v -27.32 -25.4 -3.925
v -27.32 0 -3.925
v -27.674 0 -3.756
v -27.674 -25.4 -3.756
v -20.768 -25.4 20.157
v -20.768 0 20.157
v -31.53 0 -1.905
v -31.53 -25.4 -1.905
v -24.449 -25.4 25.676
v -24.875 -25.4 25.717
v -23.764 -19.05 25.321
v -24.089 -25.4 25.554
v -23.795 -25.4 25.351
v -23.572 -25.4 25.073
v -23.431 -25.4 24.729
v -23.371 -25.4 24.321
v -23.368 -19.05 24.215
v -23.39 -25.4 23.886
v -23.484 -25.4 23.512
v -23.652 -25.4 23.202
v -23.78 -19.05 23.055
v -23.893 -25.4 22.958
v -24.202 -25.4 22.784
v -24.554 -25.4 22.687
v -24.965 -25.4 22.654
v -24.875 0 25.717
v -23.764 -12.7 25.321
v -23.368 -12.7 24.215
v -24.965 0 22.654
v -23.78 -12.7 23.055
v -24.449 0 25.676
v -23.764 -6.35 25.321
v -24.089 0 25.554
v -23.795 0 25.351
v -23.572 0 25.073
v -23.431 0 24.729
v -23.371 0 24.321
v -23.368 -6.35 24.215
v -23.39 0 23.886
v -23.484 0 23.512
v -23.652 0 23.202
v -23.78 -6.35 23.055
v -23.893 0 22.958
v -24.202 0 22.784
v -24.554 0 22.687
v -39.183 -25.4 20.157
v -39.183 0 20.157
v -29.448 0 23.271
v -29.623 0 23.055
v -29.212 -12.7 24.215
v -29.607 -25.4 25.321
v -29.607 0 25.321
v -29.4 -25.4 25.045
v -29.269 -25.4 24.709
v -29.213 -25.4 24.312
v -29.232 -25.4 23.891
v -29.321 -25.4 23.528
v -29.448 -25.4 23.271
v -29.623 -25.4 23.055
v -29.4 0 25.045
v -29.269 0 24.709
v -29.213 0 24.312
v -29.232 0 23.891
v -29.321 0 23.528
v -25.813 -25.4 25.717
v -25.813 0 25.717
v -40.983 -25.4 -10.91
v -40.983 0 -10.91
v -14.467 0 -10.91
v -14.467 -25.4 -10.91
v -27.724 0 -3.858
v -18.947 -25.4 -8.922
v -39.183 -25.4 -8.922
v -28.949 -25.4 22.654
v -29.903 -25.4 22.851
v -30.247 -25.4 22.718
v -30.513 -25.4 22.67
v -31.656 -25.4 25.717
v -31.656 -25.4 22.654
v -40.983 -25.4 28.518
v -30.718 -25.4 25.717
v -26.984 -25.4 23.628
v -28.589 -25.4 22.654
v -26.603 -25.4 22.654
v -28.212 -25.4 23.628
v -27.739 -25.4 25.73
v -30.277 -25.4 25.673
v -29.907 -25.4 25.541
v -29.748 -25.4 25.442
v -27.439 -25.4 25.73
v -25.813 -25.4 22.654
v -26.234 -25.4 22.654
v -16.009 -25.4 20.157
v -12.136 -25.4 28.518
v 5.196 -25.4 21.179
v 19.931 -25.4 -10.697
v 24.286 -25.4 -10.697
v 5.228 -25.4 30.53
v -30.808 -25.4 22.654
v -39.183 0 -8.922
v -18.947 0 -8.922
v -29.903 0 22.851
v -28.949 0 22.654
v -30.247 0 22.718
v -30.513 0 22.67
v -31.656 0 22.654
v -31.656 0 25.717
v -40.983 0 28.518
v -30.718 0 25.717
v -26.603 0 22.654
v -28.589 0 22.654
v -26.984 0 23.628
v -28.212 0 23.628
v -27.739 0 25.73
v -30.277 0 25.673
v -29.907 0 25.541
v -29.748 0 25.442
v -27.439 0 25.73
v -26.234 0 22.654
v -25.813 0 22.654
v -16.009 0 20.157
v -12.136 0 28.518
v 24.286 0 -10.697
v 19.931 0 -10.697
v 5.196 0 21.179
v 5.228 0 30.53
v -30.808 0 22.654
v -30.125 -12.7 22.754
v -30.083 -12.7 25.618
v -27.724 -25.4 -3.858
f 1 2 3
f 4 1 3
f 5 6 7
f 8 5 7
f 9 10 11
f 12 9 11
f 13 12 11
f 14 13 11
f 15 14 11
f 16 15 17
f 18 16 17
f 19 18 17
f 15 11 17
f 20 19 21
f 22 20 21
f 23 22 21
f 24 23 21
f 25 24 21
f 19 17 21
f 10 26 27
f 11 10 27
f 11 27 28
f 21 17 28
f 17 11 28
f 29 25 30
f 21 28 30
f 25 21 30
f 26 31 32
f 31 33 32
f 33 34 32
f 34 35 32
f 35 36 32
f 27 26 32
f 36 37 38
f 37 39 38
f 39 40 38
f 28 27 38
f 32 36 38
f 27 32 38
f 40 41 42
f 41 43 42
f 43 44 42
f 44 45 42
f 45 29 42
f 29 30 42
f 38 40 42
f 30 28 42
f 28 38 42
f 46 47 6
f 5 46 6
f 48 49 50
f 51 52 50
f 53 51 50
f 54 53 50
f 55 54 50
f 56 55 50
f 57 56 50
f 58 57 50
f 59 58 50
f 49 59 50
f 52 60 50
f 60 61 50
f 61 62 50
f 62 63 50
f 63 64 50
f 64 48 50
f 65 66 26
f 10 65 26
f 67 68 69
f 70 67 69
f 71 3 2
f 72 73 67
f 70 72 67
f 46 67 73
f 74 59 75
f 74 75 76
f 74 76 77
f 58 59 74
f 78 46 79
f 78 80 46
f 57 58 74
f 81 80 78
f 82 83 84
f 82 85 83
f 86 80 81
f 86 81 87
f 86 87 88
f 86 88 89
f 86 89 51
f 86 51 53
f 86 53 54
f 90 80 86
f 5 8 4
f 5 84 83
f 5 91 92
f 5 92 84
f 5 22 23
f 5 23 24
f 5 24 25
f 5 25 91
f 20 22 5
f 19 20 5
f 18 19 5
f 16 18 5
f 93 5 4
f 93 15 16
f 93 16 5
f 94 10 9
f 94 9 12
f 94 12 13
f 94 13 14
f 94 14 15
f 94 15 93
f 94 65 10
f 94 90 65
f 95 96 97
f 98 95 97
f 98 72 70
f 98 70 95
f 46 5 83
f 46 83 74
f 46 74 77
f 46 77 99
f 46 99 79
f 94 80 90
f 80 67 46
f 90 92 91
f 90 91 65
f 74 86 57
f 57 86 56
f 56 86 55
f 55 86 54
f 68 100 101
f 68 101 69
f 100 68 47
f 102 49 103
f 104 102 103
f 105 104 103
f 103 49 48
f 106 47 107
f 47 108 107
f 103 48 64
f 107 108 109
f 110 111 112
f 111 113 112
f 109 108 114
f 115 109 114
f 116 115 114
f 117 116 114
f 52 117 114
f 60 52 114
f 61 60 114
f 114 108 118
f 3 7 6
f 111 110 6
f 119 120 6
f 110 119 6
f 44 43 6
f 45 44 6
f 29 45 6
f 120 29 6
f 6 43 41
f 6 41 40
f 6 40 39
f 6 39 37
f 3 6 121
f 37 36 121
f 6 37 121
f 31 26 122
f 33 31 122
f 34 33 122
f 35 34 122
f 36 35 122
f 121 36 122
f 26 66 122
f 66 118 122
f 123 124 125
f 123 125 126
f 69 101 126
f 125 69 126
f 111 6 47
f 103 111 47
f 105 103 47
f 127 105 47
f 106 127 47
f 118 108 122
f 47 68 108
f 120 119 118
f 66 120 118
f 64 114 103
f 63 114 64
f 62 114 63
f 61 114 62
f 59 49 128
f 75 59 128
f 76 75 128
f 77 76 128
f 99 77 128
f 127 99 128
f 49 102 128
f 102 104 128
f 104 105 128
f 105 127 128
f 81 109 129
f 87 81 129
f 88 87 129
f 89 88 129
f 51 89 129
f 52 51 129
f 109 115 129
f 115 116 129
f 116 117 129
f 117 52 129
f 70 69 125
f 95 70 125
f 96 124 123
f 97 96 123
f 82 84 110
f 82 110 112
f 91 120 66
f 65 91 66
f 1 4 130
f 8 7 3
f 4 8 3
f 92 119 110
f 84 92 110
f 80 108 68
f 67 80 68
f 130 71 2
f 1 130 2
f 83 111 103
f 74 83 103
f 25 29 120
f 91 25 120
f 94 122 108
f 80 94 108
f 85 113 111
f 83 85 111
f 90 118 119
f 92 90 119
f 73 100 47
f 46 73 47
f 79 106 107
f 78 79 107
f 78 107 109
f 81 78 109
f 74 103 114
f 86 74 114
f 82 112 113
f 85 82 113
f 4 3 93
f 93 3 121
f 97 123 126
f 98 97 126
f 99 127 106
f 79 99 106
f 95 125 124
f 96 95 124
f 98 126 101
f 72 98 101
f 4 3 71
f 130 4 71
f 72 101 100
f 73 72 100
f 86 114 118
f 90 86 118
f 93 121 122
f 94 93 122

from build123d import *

# Parameters (mm, degrees)
F1_DEPTH = 25.4


with BuildPart() as f1:
    # F0 (on Front) → F1 (new body)
    with BuildSketch(Plane.XZ):
        Polygon((-14.4669092909, -10.910328379), (5.1957434184, 21.1789465251), (19.9311329773, -10.6970844829), (24.28571788, -10.6970844829), (5.2277326737, 30.5297134213), (-18.9465156888, -8.9224455917), (-39.1826219857, -8.9224455917), (-39.1826219857, 20.1574359089), (-20.7683040569, 20.1574359089), (-31.5304366217, -1.9054901972), (-27.6739607229, -3.7556812486), (-16.0093186147, 20.1574359089), (-12.1359187178, 28.5178888589), (-32.0774856955, 28.5178888589), (-40.9832447767, 28.5178888589), (-40.9832447767, -8.9224455917), (-40.9832447767, -10.910328379), align=None)
        with BuildLine():
            add(Edge.make_bspline(
                [(-29.6074078263, 25.3212274207), (-29.2115383781, 24.9253579726), (-29.2115383781, 24.2147371173)],
                knots=[0, 0, 0, 1, 1, 1], degree=2))
            add(Edge.make_bspline(
                [(-29.2115383781, 24.2147371173), (-29.2115383781, 23.4565180726), (-29.6231621566, 23.0552854482)],
                knots=[0, 0, 0, 1, 1, 1], degree=2))
            add(Edge.make_bspline(
                [(-29.6231621566, 23.0552854482), (-30.034785935, 22.6540528238), (-30.8077537144, 22.6540528238)],
                knots=[0, 0, 0, 1, 1, 1], degree=2))
            Line((-30.8077537144, 22.6540528238), (-31.6564763586, 22.6540528238))
            Line((-31.6564763586, 22.6540528238), (-31.6564763586, 25.7170968689))
            Line((-31.6564763586, 25.7170968689), (-30.717920512, 25.7170968689))
            add(Edge.make_bspline(
                [(-30.717920512, 25.7170968689), (-30.0032772745, 25.7170968689), (-29.6074078263, 25.3212274207)],
                knots=[0, 0, 0, 1, 1, 1], degree=2))
        make_face(mode=Mode.SUBTRACT)
        Polygon((-26.2343051533, 22.6540528238), (-26.6030235216, 22.6540528238), (-26.9844794335, 23.6281397132), (-28.2119764015, 23.6281397132), (-28.5887395342, 22.6540528238), (-28.9494131381, 22.6540528238), (-27.738676096, 25.7298344125), (-27.4390086221, 25.7298344125), align=None, mode=Mode.SUBTRACT)
        with BuildLine():
            add(Edge.make_bspline(
                [(-23.7642272841, 25.3212274207), (-23.368357836, 24.9253579726), (-23.368357836, 24.2147371173)],
                knots=[0, 0, 0, 1, 1, 1], degree=2))
            add(Edge.make_bspline(
                [(-23.368357836, 24.2147371173), (-23.368357836, 23.4565180726), (-23.7799816144, 23.0552854482)],
                knots=[0, 0, 0, 1, 1, 1], degree=2))
            add(Edge.make_bspline(
                [(-23.7799816144, 23.0552854482), (-24.1916053928, 22.6540528238), (-24.9645731722, 22.6540528238)],
                knots=[0, 0, 0, 1, 1, 1], degree=2))
            Line((-24.9645731722, 22.6540528238), (-25.8132958164, 22.6540528238))
            Line((-25.8132958164, 22.6540528238), (-25.8132958164, 25.7170968689))
            Line((-25.8132958164, 25.7170968689), (-24.8747399698, 25.7170968689))
            add(Edge.make_bspline(
                [(-24.8747399698, 25.7170968689), (-24.1600967323, 25.7170968689), (-23.7642272841, 25.3212274207)],
                knots=[0, 0, 0, 1, 1, 1], degree=2))
        make_face(mode=Mode.SUBTRACT)
    extrude(amount=F1_DEPTH)


with BuildPart() as f1b:
    # F0 (on Front) → F1, piece 2 (new body)
    with BuildSketch(Plane.XZ):
        Polygon((-27.3204874247, -3.9252643473), (-27.6739607229, -3.7556812486), (-27.723886267, -3.8580311857), align=None)
    extrude(amount=F1_DEPTH)


solid = Compound([f1.part, f1b.part])
